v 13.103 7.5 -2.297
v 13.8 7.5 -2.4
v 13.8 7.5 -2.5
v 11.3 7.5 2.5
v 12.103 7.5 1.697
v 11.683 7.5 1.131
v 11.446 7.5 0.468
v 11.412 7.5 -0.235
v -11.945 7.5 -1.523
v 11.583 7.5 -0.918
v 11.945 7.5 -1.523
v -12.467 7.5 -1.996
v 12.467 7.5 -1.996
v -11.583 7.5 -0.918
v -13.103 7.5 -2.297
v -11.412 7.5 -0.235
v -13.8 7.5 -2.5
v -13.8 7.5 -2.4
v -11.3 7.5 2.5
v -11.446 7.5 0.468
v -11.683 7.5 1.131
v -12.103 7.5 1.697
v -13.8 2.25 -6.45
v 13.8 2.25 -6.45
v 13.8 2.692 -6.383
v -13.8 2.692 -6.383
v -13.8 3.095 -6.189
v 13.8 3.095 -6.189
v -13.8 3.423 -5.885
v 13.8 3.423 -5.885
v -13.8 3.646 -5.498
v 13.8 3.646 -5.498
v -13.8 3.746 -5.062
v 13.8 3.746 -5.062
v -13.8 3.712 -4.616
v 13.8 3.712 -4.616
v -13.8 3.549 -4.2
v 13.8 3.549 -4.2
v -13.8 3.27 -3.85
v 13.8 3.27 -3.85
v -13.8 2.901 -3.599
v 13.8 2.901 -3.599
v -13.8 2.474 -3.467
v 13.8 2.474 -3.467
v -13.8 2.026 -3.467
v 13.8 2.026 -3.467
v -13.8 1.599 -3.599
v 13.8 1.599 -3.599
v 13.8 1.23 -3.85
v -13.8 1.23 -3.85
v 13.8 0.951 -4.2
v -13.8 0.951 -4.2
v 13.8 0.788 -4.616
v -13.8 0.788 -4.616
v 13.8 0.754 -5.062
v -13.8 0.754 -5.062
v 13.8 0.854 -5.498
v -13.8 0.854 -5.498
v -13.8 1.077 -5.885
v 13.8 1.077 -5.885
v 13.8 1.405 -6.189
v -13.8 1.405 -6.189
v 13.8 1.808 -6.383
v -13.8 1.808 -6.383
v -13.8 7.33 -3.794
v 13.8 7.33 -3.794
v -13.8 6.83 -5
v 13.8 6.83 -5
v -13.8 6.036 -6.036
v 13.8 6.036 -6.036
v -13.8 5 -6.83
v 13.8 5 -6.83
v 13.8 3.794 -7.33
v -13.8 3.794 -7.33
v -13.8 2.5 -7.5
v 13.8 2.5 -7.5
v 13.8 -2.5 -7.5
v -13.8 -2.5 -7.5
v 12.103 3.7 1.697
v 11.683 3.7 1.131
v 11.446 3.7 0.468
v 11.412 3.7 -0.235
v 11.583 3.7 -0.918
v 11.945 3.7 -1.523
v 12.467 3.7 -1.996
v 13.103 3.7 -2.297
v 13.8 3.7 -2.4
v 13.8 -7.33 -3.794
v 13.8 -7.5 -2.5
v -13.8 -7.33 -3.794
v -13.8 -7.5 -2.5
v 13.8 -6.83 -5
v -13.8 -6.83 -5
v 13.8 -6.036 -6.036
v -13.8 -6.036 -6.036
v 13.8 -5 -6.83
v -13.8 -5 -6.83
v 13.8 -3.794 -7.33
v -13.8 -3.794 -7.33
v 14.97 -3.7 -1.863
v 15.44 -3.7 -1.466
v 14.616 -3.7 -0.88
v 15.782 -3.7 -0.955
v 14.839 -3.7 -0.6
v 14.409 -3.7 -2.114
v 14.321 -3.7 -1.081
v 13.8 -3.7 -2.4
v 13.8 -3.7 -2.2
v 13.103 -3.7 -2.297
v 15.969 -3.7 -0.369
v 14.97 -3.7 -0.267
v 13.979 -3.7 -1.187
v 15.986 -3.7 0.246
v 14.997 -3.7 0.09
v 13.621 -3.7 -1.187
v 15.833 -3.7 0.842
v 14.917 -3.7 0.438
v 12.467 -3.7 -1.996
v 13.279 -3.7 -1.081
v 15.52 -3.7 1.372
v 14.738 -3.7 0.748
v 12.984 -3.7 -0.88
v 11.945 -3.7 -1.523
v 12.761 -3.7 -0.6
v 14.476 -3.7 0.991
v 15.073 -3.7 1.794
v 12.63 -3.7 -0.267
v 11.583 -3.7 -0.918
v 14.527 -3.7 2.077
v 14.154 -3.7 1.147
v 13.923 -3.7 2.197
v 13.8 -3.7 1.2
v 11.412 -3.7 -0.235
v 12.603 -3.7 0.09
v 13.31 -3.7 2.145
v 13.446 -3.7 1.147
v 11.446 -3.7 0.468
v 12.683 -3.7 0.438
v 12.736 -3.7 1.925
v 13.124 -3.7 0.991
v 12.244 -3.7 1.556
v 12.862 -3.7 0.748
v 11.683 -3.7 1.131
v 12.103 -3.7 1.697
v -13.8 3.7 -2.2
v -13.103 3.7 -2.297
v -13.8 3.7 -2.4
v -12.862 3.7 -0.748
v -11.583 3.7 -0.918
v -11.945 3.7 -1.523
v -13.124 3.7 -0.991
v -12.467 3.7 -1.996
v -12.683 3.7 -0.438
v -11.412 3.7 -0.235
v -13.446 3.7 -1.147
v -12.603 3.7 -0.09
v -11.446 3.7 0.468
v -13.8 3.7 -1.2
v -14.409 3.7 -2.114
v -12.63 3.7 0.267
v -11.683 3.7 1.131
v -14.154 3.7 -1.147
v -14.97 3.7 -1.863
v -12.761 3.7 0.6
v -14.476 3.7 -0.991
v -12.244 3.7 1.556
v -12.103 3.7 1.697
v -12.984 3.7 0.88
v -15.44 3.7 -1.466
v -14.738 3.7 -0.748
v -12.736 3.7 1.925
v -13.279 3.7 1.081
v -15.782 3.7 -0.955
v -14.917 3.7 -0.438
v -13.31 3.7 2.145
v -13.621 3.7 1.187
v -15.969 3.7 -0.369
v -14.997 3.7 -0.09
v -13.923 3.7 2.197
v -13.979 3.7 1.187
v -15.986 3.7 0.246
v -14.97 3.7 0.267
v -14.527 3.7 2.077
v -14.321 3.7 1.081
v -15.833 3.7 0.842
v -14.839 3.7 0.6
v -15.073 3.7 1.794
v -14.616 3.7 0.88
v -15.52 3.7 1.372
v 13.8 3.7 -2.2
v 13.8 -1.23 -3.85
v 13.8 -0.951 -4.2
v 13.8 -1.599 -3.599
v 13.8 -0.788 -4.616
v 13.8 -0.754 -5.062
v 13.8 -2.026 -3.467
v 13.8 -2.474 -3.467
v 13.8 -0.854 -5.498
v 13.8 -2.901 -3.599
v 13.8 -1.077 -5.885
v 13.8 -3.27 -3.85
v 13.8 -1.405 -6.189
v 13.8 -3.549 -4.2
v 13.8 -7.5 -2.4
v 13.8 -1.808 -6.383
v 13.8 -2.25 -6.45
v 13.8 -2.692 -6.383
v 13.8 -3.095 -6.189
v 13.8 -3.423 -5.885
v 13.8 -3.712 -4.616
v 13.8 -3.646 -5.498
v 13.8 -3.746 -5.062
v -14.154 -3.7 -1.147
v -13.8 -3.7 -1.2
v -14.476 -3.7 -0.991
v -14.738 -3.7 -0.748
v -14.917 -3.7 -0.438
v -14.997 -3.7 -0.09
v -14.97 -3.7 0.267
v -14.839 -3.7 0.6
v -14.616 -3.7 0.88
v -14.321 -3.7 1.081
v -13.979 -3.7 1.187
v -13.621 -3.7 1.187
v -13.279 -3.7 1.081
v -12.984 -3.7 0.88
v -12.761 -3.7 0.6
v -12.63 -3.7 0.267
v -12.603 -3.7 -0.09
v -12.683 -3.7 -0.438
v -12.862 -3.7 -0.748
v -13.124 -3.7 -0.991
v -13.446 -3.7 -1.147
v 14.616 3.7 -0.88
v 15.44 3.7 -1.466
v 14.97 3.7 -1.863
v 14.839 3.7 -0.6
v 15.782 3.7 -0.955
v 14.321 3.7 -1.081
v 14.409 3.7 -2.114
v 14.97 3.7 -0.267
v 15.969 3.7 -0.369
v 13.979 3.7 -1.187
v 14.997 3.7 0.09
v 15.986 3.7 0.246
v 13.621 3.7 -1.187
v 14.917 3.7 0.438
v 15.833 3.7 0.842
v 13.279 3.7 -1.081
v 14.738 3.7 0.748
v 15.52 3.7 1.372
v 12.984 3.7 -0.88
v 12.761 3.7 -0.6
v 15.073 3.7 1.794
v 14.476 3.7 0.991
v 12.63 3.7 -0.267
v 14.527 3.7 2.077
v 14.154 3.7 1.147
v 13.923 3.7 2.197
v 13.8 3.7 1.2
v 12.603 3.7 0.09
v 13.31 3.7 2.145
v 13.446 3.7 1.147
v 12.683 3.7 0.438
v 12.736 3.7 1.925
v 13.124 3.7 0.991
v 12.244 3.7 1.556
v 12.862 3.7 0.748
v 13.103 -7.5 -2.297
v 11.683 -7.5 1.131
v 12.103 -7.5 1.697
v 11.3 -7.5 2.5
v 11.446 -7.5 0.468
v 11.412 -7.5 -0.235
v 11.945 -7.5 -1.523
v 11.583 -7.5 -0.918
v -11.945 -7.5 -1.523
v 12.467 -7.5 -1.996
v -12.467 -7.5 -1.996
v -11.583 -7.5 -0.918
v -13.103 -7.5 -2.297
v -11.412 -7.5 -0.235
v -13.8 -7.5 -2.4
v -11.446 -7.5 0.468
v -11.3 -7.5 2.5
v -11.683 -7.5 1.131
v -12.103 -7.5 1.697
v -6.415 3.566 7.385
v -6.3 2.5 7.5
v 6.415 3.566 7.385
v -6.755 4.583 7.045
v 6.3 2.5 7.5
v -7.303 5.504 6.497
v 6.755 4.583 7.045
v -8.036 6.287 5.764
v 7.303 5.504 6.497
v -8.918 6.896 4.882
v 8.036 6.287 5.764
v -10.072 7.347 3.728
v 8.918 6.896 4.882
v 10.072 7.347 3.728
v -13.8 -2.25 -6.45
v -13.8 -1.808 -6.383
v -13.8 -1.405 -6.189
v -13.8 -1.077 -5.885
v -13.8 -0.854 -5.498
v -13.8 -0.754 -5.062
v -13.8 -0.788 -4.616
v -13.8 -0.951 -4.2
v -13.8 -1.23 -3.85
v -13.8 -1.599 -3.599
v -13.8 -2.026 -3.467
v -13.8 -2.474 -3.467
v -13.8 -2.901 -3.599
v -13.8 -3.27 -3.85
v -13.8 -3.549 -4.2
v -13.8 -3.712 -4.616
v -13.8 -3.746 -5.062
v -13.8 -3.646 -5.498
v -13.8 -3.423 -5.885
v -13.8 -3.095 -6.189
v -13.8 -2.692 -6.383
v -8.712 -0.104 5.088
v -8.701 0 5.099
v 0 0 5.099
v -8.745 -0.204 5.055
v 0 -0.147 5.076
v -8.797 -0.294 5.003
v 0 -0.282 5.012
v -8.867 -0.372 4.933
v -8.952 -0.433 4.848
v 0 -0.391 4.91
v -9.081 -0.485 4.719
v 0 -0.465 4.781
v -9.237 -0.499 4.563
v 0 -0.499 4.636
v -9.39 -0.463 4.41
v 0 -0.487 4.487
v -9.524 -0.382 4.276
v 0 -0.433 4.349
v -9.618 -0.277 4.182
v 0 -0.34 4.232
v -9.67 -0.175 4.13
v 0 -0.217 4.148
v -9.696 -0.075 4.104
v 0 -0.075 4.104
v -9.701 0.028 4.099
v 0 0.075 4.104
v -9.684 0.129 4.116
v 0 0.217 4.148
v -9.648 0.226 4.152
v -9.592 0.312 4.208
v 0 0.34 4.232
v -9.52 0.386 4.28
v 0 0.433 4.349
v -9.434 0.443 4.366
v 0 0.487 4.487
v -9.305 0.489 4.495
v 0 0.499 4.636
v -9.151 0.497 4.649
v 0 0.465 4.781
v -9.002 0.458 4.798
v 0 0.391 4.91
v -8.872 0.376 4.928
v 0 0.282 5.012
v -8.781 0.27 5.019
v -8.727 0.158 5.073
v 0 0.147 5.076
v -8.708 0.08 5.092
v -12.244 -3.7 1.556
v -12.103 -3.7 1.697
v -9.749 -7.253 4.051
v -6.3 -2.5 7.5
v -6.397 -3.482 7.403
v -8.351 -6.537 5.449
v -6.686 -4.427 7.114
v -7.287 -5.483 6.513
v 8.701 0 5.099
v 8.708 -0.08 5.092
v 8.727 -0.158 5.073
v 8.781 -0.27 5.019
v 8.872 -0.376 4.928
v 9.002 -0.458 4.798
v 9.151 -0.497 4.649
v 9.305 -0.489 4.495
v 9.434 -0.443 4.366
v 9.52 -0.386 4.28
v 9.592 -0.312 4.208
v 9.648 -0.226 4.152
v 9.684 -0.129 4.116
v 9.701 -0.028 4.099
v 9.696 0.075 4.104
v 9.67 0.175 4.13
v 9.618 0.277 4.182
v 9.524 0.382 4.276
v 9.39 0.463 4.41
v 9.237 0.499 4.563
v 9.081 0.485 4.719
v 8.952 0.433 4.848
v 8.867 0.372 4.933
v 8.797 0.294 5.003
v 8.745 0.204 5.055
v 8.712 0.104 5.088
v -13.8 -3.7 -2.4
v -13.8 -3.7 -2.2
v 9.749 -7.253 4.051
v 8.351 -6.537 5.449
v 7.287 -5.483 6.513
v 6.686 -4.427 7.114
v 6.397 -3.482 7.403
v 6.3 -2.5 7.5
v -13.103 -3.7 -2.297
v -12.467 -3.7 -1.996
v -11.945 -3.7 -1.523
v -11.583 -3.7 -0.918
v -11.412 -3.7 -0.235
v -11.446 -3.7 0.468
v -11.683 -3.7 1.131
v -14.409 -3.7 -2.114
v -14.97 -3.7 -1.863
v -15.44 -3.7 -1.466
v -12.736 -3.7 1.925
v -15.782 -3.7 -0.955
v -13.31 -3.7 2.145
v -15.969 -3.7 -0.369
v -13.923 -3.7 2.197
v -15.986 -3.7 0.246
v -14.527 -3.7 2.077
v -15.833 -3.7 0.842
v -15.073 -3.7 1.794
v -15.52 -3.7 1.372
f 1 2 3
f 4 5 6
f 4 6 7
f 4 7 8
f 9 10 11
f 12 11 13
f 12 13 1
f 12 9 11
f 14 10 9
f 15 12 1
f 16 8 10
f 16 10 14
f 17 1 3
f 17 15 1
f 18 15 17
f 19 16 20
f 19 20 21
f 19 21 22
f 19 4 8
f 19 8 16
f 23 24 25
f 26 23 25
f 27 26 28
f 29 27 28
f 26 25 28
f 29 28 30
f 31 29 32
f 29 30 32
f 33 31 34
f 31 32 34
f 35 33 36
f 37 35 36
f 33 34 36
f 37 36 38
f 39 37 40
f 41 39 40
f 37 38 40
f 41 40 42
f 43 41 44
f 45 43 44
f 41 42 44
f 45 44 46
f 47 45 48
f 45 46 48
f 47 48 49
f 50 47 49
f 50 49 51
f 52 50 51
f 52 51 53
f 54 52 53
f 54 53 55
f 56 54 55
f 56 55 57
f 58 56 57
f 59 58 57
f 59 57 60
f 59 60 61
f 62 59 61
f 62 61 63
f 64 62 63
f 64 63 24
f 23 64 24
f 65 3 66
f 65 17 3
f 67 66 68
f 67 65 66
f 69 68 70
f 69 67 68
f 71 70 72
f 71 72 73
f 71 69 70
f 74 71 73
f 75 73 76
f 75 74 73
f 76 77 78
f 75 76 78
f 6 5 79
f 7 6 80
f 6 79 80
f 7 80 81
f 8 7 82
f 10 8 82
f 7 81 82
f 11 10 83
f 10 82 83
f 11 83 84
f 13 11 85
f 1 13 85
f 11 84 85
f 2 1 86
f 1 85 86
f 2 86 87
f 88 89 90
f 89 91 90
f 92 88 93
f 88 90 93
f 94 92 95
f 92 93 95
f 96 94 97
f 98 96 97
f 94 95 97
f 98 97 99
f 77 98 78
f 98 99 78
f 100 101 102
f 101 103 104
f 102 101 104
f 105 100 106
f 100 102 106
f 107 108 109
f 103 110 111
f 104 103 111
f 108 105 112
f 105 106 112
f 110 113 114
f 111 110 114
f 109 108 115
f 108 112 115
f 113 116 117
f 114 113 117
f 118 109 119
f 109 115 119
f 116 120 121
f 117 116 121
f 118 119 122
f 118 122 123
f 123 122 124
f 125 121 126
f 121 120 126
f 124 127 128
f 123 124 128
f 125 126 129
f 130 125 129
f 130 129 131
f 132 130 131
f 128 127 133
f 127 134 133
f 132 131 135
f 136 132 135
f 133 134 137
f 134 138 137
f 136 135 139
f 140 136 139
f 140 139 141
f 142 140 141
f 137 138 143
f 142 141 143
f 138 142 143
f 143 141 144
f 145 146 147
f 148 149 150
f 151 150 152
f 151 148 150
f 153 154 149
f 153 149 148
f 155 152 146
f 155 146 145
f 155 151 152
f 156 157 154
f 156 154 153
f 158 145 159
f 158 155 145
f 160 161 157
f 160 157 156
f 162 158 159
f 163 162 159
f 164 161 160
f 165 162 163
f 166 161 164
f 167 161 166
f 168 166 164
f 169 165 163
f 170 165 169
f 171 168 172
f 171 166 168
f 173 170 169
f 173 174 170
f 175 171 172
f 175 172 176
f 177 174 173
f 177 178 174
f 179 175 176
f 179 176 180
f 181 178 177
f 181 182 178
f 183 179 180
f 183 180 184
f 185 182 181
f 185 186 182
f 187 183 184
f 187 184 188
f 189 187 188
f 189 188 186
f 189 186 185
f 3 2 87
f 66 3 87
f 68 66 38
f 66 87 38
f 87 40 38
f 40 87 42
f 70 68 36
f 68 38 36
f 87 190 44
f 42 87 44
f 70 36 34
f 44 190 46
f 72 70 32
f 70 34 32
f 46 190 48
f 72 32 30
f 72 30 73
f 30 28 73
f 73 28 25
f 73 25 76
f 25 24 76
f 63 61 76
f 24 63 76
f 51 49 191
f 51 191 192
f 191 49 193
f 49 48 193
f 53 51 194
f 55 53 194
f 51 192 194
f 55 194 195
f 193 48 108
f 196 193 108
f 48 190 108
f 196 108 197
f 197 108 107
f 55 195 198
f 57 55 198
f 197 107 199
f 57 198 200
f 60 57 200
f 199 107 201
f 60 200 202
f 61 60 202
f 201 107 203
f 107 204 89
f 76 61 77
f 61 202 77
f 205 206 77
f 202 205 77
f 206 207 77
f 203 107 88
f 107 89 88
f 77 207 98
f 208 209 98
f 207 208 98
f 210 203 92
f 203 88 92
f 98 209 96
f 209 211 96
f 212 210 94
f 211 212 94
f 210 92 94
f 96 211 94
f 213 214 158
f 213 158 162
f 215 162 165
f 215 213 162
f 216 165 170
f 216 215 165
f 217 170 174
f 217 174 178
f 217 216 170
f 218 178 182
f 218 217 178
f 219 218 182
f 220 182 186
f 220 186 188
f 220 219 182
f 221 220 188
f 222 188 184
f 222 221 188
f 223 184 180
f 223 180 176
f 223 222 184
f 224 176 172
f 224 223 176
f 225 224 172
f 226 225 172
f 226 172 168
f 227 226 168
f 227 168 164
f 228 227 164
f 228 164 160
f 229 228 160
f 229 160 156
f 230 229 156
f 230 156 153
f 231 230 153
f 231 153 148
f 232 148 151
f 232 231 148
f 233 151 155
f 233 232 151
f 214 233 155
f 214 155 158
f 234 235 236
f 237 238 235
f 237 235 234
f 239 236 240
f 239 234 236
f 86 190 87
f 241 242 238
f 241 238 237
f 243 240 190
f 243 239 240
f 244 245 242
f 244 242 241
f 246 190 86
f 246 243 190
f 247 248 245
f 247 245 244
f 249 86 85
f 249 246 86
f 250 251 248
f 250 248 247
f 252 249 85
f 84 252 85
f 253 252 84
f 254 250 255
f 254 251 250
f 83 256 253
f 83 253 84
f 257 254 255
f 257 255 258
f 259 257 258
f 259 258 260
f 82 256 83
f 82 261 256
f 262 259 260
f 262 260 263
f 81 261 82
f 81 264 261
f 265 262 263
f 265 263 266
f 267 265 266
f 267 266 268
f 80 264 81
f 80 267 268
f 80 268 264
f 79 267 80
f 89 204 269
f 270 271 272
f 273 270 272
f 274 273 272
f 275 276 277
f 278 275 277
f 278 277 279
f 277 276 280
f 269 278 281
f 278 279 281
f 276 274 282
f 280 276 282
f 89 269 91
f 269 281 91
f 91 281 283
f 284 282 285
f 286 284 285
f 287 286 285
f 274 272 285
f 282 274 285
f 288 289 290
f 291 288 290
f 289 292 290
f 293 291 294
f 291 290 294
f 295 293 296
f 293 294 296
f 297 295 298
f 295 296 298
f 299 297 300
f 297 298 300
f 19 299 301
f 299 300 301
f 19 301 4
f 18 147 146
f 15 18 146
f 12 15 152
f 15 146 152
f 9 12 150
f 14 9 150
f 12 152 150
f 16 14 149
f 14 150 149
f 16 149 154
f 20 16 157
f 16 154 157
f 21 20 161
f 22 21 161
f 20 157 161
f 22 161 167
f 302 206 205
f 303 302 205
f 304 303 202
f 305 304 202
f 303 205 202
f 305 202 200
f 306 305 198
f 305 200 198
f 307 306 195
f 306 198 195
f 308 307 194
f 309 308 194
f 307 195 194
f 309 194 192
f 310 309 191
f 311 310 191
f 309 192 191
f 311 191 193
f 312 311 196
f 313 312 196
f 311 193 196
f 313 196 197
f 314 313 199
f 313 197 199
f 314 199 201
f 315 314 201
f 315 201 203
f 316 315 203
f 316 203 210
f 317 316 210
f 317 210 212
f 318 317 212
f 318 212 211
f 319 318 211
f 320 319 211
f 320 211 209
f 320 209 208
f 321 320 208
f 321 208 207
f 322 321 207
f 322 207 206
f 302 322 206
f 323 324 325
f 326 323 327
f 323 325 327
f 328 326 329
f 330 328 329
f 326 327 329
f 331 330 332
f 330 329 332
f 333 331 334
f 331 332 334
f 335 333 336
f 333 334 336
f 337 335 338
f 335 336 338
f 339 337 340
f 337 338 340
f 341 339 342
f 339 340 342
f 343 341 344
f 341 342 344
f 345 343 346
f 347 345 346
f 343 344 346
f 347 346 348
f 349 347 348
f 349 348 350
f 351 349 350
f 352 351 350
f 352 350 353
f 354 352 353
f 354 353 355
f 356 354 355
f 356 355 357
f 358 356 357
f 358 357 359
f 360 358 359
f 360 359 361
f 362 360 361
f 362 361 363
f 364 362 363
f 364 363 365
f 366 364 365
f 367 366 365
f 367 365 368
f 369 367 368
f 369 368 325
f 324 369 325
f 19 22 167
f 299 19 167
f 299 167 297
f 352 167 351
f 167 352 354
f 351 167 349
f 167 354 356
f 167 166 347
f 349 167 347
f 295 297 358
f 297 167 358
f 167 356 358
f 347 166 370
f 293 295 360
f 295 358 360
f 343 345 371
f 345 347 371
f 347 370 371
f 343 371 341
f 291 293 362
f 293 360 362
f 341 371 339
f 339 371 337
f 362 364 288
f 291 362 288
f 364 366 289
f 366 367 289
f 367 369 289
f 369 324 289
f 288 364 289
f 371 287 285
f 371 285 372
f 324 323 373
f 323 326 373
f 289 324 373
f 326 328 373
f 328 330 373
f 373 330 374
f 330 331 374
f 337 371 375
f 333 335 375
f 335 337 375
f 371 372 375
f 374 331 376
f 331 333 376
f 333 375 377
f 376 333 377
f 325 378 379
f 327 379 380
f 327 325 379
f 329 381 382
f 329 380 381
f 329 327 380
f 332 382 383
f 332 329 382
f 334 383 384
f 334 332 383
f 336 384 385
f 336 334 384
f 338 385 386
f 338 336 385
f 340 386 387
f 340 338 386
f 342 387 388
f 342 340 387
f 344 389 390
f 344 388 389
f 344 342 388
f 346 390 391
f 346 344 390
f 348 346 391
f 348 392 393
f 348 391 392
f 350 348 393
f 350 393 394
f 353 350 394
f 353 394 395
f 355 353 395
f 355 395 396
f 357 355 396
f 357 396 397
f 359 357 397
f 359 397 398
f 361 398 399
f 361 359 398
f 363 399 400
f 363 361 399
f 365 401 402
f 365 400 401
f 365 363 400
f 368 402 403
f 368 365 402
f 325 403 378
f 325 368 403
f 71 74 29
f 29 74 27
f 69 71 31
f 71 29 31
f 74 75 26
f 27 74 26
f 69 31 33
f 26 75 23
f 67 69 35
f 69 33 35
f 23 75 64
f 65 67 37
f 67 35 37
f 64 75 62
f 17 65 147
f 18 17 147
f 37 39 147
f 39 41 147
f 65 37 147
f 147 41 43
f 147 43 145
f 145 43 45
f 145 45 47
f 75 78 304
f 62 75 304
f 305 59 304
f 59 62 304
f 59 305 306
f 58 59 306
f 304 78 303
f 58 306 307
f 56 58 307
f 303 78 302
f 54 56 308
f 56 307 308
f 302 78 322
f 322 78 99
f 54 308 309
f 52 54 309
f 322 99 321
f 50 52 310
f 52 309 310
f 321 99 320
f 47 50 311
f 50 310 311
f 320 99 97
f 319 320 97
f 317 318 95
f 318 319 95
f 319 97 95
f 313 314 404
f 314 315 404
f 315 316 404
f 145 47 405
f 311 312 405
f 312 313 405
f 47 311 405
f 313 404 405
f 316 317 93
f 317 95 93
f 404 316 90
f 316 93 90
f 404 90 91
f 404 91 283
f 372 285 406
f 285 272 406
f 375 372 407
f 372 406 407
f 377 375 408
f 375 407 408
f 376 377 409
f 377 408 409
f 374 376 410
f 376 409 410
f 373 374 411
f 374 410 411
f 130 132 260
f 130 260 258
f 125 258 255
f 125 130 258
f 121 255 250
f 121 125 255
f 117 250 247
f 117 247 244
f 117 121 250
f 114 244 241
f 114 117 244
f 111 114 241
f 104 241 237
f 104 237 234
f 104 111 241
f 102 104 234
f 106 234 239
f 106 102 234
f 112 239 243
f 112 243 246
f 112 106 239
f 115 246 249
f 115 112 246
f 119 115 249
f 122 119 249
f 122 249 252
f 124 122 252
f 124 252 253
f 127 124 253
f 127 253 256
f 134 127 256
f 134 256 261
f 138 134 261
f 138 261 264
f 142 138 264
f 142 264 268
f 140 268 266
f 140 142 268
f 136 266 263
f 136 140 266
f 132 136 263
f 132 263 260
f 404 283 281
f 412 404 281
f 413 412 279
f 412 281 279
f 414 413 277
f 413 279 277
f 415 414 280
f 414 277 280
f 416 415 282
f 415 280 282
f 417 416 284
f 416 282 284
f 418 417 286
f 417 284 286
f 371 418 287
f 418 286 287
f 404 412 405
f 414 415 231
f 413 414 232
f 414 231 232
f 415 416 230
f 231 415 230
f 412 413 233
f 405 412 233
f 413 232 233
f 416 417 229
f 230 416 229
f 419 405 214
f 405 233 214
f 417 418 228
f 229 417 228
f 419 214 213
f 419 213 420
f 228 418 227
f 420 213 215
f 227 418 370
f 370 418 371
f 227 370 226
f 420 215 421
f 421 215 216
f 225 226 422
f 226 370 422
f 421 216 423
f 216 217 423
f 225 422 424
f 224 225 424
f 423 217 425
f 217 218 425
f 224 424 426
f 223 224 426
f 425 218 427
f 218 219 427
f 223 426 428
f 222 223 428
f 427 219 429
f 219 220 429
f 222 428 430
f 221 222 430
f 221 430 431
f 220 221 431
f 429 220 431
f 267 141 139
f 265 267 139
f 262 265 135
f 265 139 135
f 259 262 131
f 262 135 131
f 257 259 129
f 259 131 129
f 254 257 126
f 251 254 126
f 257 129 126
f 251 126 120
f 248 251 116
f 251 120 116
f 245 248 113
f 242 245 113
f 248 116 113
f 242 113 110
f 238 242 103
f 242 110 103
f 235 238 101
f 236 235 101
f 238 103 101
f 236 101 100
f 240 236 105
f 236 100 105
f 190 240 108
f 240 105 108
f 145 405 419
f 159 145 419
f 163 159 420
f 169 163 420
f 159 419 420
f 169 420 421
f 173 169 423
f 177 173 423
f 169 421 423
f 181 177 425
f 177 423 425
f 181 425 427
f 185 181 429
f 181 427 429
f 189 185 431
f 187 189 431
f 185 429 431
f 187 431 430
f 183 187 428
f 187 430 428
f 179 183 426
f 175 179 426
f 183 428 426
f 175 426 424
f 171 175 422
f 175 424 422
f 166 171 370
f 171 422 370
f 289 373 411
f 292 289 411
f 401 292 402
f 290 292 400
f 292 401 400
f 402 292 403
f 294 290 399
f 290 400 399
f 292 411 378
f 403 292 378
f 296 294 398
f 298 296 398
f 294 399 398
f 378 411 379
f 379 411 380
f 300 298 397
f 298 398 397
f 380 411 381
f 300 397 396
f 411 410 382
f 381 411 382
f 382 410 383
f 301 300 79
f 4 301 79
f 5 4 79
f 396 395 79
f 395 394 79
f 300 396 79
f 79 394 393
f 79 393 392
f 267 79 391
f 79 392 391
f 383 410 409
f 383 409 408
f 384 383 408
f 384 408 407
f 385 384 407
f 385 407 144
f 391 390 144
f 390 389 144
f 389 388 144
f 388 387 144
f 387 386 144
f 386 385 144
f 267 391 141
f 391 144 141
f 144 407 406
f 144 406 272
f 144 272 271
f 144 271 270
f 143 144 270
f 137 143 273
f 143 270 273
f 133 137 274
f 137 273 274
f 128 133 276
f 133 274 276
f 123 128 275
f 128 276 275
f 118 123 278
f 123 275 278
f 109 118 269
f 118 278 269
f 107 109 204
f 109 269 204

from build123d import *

# Parameters (mm, degrees)
BOSS_EXTRUDE1_DEPTH            = 7.5
BOSS_EXTRUDE1_DEPTH_BACK       = 7.5
CUT_EXTRUDE3_REACH             = 31.568
SKETCH5_R                      = 1.5
FILLET1_R                      = 5
CUT_EXTRUDE2_REACH             = 19.405
SKETCH3_R                      = 0.5
CUT_EXTRUDE2_DIRECTION_2_REACH = 19.405
FILLET2_R                      = 5
BOSS_EXTRUDE2_DEPTH            = 3.7
BOSS_EXTRUDE2_DEPTH_BACK       = 3.7
SKETCH6_R                      = 1.2


with BuildPart() as part:
    # Sketch1 → Boss-Extrude1 (new, two sides: drawn at the far end of the back side and taken through both)
    with BuildSketch(Plane(origin=(0, 0, 0), x_dir=(-1, 0, 0), z_dir=(0, 1, 0)).offset(-BOSS_EXTRUDE1_DEPTH_BACK)):
        with BuildLine():
            Line((6.3, 7.5), (-6.3, 7.5))
            Line((-6.3, 7.5), (-12.102943725, 1.697056275))
            ThreePointArc((-12.102943725, 1.697056275), (-11.582689122, -0.918440238), (-13.8, -2.4))
            Line((-13.8, -2.4), (-13.8, -7.5))
            Line((-13.8, -7.5), (13.8, -7.5))
            Line((13.8, -7.5), (13.8, -2.4))
            ThreePointArc((13.8, -2.4), (11.582689122, -0.918440238), (12.102943725, 1.697056275))
            Line((12.102943725, 1.697056275), (6.3, 7.5))
        make_face()
    extrude(amount=BOSS_EXTRUDE1_DEPTH + BOSS_EXTRUDE1_DEPTH_BACK)

    # Sketch5 → Cut-Extrude3 (cut, up to next)
    with BuildSketch(Plane.YZ.offset(13.8), mode=Mode.PRIVATE) as cut_extrude3_sk1:
        with Locations(Location((-2.25, -4.95, 0), (0, 0, 270))):
            Circle(SKETCH5_R)
    cut_extrude3_tool1 = extrude(cut_extrude3_sk1.sketch, amount=-CUT_EXTRUDE3_REACH, mode=Mode.PRIVATE) & part.part
    # Sketch5 → Cut-Extrude3 (cut, up to next)
    with BuildSketch(Plane.YZ.offset(13.8), mode=Mode.PRIVATE) as cut_extrude3_sk2:
        with Locations(Location((2.25, -4.95, 0), (0, 0, 270))):
            Circle(SKETCH5_R)
    cut_extrude3_tool2 = extrude(cut_extrude3_sk2.sketch, amount=-CUT_EXTRUDE3_REACH, mode=Mode.PRIVATE) & part.part
    add(cut_extrude3_tool1.solids().sort_by_distance((13.8, -2.25, -4.95))[0], mode=Mode.SUBTRACT)
    add(cut_extrude3_tool2.solids().sort_by_distance((13.8, 2.25, -4.95))[0], mode=Mode.SUBTRACT)

    # Fillet1
    fillet1_edges = [part.edges().sort_by_distance(p)[0] for p in [
        (0, -7.5, -7.5),
        (0, 7.5, -7.5),
    ]]
    fillet(fillet1_edges, radius=FILLET1_R)

    # Cut-Extrude2: up to this plane
    cut_extrude2_end = Plane(origin=(-6.9, -7.5, 6.9), z_dir=(0.7071067811865475, 0, -0.7071067811865477))
    # Sketch3 → Cut-Extrude2 (cut, up to the surface)
    with BuildSketch(Plane.YZ, mode=Mode.PRIVATE) as cut_extrude2_sk1:
        with Locations(Location((0, 4.598528137, 0), (0, 0, 90))):
            Circle(SKETCH3_R)
    cut_extrude2_tool1 = split(extrude(cut_extrude2_sk1.sketch, amount=-CUT_EXTRUDE2_REACH, mode=Mode.PRIVATE), bisect_by=cut_extrude2_end, keep=Keep.BOTH, mode=Mode.PRIVATE)
    add(cut_extrude2_tool1.solids().sort_by_distance((0, 0, 4.598528))[0], mode=Mode.SUBTRACT)

    # Cut-Extrude2 direction 2: up to this plane
    cut_extrude2_direction_2_end = Plane(origin=(6.9, -7.5, 6.9), z_dir=(-0.7071067811865475, 0, -0.7071067811865476))
    # Sketch3 → Cut-Extrude2 direction 2 (cut, up to the surface)
    with BuildSketch(Plane.YZ, mode=Mode.PRIVATE) as cut_extrude2_direction_2_sk1:
        with Locations(Location((0, 4.598528137, 0), (0, 0, 90))):
            Circle(SKETCH3_R)
    cut_extrude2_direction_2_tool1 = split(extrude(cut_extrude2_direction_2_sk1.sketch, amount=CUT_EXTRUDE2_DIRECTION_2_REACH, mode=Mode.PRIVATE), bisect_by=cut_extrude2_direction_2_end, keep=Keep.BOTH, mode=Mode.PRIVATE)
    add(cut_extrude2_direction_2_tool1.solids().sort_by_distance((0, 0, 4.598528))[0], mode=Mode.SUBTRACT)

    # Fillet2
    fillet2_edges = [part.edges().sort_by_distance(p)[0] for p in [
        (0, 7.5, 7.5),
        (0, -7.5, 7.5),
    ]]
    fillet(fillet2_edges, radius=FILLET2_R)

    # Sketch6 → Boss-Extrude2 (add, two sides: drawn at the far end of the back side and taken through both)
    # profile 1 of 2: a face of its own
    with BuildSketch(Plane(origin=(0, 0, 0), x_dir=(-1, 0, 0), z_dir=(0, 1, 0)).offset(-BOSS_EXTRUDE2_DEPTH_BACK)):
        with BuildLine():
            Line((-12.102943725, 1.697056275), (-12.244365081, 1.555634919))
            ThreePointArc((-12.244365081, 1.555634919), (-15.832534972, 0.841903551), (-13.8, -2.2))
            Line((-13.8, -2.2), (-13.8, -2.4))
            ThreePointArc((-13.8, -2.4), (-11.582689122, -0.918440238), (-12.102943725, 1.697056275))
        make_face()
        with Locations(Location((-13.8, 0, 0), (0, 0, 90))):
            Circle(SKETCH6_R, mode=Mode.SUBTRACT)
    # profile 2 of 2: a face of its own
    with BuildSketch(Plane(origin=(0, 0, 0), x_dir=(-1, 0, 0), z_dir=(0, 1, 0)).offset(-BOSS_EXTRUDE2_DEPTH_BACK)):
        with BuildLine():
            Line((13.8, -2.4), (13.8, -2.2))
            ThreePointArc((13.8, -2.2), (15.832534972, 0.841903551), (12.244365081, 1.555634919))
            Line((12.244365081, 1.555634919), (12.102943725, 1.697056275))
            ThreePointArc((12.102943725, 1.697056275), (11.582689122, -0.918440238), (13.8, -2.4))
        make_face()
        with Locations(Location((13.8, 0, 0), (0, 0, 270))):
            Circle(SKETCH6_R, mode=Mode.SUBTRACT)
    extrude(amount=BOSS_EXTRUDE2_DEPTH + BOSS_EXTRUDE2_DEPTH_BACK)


solid = part.part
